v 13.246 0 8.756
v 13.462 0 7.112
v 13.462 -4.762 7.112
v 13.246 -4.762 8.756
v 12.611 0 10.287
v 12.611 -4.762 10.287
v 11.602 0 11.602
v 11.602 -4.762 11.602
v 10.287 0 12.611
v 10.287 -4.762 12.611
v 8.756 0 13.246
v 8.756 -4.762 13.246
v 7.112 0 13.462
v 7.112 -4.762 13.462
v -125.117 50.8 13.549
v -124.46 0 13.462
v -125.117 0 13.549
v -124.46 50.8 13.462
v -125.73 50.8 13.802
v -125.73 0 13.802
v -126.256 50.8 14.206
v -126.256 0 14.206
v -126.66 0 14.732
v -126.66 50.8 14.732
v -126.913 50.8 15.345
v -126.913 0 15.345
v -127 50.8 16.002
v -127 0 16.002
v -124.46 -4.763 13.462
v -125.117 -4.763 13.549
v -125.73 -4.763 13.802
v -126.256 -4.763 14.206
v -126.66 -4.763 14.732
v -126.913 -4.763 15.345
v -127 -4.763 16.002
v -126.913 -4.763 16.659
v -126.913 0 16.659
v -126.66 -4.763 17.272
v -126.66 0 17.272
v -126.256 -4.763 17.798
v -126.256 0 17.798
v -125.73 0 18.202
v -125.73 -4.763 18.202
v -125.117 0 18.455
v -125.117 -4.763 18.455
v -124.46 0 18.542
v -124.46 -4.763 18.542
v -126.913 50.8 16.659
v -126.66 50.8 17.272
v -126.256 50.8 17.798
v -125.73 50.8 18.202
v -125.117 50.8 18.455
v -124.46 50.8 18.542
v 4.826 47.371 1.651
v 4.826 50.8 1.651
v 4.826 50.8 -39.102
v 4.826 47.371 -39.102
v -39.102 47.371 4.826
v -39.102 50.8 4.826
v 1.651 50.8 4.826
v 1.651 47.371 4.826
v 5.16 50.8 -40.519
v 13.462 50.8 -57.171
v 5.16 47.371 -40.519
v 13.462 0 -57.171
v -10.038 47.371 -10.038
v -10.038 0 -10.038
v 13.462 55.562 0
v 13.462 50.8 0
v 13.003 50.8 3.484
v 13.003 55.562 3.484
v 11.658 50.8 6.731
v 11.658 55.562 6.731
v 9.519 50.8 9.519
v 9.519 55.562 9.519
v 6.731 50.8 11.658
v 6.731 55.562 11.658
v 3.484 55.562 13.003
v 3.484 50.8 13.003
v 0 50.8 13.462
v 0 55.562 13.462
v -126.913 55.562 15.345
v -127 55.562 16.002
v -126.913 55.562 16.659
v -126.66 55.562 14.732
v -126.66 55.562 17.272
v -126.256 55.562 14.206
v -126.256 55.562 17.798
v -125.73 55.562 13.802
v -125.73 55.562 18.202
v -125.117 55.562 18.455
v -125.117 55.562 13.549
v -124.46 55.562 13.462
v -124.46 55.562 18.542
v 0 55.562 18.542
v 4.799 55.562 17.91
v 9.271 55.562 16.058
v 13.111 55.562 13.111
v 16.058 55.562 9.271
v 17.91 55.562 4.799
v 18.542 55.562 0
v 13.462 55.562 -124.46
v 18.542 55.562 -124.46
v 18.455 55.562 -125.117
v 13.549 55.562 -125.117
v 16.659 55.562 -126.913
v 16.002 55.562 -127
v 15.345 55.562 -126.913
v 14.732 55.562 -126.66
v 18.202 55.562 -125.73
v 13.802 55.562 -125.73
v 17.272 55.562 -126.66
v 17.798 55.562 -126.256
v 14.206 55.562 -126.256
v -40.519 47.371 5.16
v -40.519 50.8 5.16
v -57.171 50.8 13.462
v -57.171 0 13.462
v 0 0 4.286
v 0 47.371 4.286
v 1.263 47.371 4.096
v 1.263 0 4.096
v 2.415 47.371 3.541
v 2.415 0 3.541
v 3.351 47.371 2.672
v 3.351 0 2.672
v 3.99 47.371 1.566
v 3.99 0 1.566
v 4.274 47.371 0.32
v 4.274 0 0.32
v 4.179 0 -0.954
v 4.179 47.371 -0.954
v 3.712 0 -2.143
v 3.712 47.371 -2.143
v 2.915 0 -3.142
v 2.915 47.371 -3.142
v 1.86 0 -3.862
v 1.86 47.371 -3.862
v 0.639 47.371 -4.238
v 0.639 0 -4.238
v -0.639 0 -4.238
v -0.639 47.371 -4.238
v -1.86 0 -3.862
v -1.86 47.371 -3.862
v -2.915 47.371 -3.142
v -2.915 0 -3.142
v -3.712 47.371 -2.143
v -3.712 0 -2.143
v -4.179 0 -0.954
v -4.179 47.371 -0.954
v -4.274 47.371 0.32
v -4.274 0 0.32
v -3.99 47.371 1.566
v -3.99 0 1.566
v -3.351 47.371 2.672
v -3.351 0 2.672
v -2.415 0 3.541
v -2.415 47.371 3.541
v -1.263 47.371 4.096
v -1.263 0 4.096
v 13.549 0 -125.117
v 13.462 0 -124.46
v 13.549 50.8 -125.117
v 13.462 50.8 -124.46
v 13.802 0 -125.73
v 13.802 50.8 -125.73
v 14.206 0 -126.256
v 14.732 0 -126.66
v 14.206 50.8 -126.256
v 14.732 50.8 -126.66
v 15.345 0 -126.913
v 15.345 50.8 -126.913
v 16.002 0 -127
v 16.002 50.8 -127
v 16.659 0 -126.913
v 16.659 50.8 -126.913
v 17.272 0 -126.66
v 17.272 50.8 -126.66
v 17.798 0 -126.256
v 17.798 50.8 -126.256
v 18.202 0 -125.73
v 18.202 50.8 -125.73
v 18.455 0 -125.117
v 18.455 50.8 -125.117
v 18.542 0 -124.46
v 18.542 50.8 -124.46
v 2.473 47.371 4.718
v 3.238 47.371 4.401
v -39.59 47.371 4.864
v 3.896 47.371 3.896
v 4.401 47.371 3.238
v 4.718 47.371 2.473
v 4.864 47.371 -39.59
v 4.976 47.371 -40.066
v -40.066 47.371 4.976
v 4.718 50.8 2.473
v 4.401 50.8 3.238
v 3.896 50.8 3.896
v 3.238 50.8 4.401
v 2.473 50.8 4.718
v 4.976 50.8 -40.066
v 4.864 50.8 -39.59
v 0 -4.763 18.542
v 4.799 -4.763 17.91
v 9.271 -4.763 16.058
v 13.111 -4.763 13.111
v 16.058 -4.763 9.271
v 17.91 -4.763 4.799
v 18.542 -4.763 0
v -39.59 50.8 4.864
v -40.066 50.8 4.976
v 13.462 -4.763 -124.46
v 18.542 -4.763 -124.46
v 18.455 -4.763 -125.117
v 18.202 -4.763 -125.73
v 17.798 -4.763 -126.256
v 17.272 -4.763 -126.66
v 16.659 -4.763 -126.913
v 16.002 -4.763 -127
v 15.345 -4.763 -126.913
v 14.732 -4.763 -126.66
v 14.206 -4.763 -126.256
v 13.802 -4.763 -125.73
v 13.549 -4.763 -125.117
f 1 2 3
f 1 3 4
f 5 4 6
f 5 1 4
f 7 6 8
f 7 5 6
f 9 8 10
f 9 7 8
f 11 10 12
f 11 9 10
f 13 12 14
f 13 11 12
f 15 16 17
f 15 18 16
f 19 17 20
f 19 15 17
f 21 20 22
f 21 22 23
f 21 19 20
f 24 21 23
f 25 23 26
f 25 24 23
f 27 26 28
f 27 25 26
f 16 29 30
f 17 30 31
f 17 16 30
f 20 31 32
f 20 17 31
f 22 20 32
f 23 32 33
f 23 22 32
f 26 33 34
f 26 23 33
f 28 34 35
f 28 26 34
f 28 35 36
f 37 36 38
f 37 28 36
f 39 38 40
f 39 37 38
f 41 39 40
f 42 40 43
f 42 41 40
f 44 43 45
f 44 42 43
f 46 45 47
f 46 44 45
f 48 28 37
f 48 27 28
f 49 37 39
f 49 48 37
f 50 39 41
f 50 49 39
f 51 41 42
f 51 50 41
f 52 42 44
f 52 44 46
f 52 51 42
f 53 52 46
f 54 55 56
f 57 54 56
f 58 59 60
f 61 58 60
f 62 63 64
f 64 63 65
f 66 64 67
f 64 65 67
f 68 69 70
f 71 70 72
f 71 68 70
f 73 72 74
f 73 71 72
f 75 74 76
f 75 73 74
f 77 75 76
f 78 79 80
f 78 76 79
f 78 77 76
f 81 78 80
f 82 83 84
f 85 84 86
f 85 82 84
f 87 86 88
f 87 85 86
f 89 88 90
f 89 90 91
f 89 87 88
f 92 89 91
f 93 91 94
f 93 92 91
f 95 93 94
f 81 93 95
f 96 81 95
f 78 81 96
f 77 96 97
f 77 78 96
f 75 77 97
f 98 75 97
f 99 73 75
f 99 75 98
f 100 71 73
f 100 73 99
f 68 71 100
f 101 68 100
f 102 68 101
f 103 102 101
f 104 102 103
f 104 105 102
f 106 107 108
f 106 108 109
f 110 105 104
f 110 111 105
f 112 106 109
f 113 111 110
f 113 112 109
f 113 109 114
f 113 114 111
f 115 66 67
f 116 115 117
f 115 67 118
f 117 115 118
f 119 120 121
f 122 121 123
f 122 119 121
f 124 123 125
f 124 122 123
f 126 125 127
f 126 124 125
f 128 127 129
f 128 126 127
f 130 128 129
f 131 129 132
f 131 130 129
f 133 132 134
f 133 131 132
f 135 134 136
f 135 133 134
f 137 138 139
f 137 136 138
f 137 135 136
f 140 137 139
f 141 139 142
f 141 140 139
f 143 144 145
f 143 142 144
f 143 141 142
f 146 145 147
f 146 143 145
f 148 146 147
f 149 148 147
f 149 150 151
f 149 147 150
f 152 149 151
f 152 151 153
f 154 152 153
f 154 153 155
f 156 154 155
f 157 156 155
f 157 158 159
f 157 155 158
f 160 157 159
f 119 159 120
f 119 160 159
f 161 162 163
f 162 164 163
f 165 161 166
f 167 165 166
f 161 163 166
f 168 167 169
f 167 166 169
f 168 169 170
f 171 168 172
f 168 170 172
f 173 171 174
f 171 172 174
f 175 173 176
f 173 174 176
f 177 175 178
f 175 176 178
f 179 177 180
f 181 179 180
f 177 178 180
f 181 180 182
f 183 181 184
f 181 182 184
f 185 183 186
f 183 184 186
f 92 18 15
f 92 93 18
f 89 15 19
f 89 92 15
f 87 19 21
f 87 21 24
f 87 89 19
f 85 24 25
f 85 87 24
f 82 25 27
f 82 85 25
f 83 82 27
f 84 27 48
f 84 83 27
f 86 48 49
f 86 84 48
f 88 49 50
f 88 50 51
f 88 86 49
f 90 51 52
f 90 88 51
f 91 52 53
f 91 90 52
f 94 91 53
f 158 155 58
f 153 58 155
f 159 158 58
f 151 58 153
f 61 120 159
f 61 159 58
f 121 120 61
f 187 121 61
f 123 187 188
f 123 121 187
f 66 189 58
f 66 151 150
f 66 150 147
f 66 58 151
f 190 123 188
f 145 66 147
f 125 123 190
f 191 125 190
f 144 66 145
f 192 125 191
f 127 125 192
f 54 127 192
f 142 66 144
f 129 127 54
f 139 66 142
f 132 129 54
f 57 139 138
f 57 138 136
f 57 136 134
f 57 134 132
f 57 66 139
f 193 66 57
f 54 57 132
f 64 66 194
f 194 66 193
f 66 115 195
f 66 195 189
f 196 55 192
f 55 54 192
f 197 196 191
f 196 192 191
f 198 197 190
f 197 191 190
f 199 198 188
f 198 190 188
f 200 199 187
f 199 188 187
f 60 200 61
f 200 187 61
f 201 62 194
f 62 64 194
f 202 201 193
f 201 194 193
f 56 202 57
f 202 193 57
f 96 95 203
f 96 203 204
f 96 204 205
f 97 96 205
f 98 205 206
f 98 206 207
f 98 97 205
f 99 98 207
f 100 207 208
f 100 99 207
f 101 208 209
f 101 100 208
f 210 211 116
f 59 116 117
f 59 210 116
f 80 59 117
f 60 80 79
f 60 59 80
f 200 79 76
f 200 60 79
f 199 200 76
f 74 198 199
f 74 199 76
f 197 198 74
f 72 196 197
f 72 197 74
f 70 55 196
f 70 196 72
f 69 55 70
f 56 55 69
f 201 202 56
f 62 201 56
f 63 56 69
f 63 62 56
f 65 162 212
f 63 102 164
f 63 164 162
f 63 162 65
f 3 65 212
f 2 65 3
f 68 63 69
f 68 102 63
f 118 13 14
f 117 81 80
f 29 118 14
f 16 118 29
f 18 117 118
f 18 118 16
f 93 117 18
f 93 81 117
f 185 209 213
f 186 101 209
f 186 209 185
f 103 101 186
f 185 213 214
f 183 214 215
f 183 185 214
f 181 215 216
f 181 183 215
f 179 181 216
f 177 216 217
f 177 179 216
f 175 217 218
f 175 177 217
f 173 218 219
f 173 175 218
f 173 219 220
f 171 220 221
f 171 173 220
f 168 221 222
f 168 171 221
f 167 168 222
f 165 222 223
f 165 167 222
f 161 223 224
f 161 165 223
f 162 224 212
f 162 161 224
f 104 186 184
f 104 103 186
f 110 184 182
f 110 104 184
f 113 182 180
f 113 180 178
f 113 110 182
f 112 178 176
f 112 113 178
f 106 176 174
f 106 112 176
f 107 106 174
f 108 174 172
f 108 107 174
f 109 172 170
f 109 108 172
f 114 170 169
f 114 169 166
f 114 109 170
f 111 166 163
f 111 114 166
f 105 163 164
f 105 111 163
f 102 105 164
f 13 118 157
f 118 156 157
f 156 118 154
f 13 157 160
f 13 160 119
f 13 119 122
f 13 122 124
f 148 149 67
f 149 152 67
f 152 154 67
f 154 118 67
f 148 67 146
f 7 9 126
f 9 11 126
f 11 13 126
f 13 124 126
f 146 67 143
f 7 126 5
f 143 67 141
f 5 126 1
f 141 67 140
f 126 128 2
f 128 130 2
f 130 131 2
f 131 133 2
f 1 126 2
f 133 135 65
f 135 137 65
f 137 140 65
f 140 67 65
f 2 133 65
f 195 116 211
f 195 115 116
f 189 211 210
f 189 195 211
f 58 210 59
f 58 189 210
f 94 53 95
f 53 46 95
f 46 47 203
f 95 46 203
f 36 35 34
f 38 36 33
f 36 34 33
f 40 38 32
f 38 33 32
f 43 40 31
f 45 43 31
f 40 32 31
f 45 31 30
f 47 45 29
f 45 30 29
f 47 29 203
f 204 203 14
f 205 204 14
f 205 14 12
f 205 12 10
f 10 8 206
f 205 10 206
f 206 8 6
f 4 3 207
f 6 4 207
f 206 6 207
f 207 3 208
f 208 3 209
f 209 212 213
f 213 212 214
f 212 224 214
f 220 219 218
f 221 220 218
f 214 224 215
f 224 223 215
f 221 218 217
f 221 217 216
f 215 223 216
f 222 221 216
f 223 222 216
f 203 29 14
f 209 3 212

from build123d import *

# Parameters (mm, degrees)
SKETCH1_R           = 4.28625
BOSS_EXTRUDE1_DEPTH = 50.8
FILLET2_R           = 2.54
SKETCH7_W           = 44.675933609
SKETCH7_H           = 44.675933609
CUT_EXTRUDE3_DEPTH  = 3.429
FILLET9_R           = 3.175
BOSS_EXTRUDE2_DEPTH = 30.1625
CUT_EXTRUDE4_START  = -4.7625
CUT_EXTRUDE4_DEPTH  = 4.7625


with BuildPart() as part:
    # Sketch1 → Boss-Extrude1 (new body)
    with BuildSketch(Plane(origin=(0, 0, 0), x_dir=(1, 0, 0), z_dir=(0, 1, 0))):
        with BuildLine():
            Line((13.462, 57.17106993), (-10.037787665, 10.037787665))
            Line((-10.037787665, 10.037787665), (-57.17106993, -13.462))
            Line((-57.17106993, -13.462), (-127, -13.462))
            Line((-127, -13.462), (-127, -18.542))
            Line((-127, -18.542), (0, -18.542))
            ThreePointArc((0, -18.542), (13.111173937, -13.111173937), (18.542, 0))
            Line((18.542, 0), (18.542, 127))
            Line((18.542, 127), (13.462, 127))
            Line((13.462, 127), (13.462, 57.17106993))
        make_face()
        with Locations(Location((0, 0, 0), (0, 0, 270))):
            Circle(SKETCH1_R, mode=Mode.SUBTRACT)
    extrude(amount=BOSS_EXTRUDE1_DEPTH)

    # Fillet2
    fillet2_edges = [part.edges().sort_by_distance(p)[0] for p in [
        (13.462, 25.4, -127),
        (18.542, 25.4, -127),
        (-127, 25.4, 13.462),
        (-127, 25.4, 18.542),
    ]]
    fillet(fillet2_edges, radius=FILLET2_R - 0.0001)  # a hair under: the kernel refuses the full size

    # Sketch7 → Cut-Extrude3 (cut)
    with BuildSketch(Plane(origin=(0, 50.8, 0), x_dir=(1, 0, 0), z_dir=(0, 1, 0))):
        with Locations((-17.511966805, 17.511966805)):
            Rectangle(SKETCH7_W, SKETCH7_H)
    extrude(amount=-CUT_EXTRUDE3_DEPTH, mode=Mode.SUBTRACT)

    # Fillet9
    fillet9_edges = [part.edges().sort_by_distance(p)[0] for p in [
        (4.826, 49.0855, -39.849933609),
        (4.826, 49.0855, 4.826),
        (-39.849933609, 49.0855, 4.826),
    ]]
    fillet(fillet9_edges, radius=FILLET9_R)

    # Sketch8 → Boss-Extrude2 (add, symmetric)
    with BuildSketch(Plane(origin=(0, 25.4, 0), x_dir=(1, 0, 0), z_dir=(0, 1, 0))):
        with BuildLine():
            Line((0, -13.462), (-124.46, -13.462))
            ThreePointArc((-124.46, -13.462), (-126.256051224, -14.205948776), (-127, -16.002))
            ThreePointArc((-127, -16.002), (-126.256051224, -17.798051224), (-124.46, -18.542))
            Line((-124.46, -18.542), (0, -18.542))
            ThreePointArc((0, -18.542), (13.111173937, -13.111173937), (18.542, 0))
            Line((18.542, 0), (18.542, 124.46))
            ThreePointArc((18.542, 124.46), (17.798051224, 126.256051224), (16.002, 127))
            ThreePointArc((16.002, 127), (14.205948776, 126.256051224), (13.462, 124.46))
            Line((13.462, 124.46), (13.462, 0))
            ThreePointArc((13.462, 0), (9.519071488, -9.519071488), (0, -13.462))
        make_face()
    extrude(amount=BOSS_EXTRUDE2_DEPTH, both=True)

    # Sketch9 → Cut-Extrude4 (cut)
    with BuildSketch(Plane.XZ.offset(4.7625).offset(CUT_EXTRUDE4_START)):
        with BuildLine():
            Line((7.112, 13.462), (0, 13.462))
            ThreePointArc((0, 13.462), (9.519071488, 9.519071488), (13.462, 0))
            Line((13.462, 0), (13.462, 7.112))
            ThreePointArc((13.462, 7.112), (11.602128061, 11.602128061), (7.112, 13.462))
        make_face()
    extrude(amount=CUT_EXTRUDE4_DEPTH, mode=Mode.SUBTRACT)


solid = part.part
